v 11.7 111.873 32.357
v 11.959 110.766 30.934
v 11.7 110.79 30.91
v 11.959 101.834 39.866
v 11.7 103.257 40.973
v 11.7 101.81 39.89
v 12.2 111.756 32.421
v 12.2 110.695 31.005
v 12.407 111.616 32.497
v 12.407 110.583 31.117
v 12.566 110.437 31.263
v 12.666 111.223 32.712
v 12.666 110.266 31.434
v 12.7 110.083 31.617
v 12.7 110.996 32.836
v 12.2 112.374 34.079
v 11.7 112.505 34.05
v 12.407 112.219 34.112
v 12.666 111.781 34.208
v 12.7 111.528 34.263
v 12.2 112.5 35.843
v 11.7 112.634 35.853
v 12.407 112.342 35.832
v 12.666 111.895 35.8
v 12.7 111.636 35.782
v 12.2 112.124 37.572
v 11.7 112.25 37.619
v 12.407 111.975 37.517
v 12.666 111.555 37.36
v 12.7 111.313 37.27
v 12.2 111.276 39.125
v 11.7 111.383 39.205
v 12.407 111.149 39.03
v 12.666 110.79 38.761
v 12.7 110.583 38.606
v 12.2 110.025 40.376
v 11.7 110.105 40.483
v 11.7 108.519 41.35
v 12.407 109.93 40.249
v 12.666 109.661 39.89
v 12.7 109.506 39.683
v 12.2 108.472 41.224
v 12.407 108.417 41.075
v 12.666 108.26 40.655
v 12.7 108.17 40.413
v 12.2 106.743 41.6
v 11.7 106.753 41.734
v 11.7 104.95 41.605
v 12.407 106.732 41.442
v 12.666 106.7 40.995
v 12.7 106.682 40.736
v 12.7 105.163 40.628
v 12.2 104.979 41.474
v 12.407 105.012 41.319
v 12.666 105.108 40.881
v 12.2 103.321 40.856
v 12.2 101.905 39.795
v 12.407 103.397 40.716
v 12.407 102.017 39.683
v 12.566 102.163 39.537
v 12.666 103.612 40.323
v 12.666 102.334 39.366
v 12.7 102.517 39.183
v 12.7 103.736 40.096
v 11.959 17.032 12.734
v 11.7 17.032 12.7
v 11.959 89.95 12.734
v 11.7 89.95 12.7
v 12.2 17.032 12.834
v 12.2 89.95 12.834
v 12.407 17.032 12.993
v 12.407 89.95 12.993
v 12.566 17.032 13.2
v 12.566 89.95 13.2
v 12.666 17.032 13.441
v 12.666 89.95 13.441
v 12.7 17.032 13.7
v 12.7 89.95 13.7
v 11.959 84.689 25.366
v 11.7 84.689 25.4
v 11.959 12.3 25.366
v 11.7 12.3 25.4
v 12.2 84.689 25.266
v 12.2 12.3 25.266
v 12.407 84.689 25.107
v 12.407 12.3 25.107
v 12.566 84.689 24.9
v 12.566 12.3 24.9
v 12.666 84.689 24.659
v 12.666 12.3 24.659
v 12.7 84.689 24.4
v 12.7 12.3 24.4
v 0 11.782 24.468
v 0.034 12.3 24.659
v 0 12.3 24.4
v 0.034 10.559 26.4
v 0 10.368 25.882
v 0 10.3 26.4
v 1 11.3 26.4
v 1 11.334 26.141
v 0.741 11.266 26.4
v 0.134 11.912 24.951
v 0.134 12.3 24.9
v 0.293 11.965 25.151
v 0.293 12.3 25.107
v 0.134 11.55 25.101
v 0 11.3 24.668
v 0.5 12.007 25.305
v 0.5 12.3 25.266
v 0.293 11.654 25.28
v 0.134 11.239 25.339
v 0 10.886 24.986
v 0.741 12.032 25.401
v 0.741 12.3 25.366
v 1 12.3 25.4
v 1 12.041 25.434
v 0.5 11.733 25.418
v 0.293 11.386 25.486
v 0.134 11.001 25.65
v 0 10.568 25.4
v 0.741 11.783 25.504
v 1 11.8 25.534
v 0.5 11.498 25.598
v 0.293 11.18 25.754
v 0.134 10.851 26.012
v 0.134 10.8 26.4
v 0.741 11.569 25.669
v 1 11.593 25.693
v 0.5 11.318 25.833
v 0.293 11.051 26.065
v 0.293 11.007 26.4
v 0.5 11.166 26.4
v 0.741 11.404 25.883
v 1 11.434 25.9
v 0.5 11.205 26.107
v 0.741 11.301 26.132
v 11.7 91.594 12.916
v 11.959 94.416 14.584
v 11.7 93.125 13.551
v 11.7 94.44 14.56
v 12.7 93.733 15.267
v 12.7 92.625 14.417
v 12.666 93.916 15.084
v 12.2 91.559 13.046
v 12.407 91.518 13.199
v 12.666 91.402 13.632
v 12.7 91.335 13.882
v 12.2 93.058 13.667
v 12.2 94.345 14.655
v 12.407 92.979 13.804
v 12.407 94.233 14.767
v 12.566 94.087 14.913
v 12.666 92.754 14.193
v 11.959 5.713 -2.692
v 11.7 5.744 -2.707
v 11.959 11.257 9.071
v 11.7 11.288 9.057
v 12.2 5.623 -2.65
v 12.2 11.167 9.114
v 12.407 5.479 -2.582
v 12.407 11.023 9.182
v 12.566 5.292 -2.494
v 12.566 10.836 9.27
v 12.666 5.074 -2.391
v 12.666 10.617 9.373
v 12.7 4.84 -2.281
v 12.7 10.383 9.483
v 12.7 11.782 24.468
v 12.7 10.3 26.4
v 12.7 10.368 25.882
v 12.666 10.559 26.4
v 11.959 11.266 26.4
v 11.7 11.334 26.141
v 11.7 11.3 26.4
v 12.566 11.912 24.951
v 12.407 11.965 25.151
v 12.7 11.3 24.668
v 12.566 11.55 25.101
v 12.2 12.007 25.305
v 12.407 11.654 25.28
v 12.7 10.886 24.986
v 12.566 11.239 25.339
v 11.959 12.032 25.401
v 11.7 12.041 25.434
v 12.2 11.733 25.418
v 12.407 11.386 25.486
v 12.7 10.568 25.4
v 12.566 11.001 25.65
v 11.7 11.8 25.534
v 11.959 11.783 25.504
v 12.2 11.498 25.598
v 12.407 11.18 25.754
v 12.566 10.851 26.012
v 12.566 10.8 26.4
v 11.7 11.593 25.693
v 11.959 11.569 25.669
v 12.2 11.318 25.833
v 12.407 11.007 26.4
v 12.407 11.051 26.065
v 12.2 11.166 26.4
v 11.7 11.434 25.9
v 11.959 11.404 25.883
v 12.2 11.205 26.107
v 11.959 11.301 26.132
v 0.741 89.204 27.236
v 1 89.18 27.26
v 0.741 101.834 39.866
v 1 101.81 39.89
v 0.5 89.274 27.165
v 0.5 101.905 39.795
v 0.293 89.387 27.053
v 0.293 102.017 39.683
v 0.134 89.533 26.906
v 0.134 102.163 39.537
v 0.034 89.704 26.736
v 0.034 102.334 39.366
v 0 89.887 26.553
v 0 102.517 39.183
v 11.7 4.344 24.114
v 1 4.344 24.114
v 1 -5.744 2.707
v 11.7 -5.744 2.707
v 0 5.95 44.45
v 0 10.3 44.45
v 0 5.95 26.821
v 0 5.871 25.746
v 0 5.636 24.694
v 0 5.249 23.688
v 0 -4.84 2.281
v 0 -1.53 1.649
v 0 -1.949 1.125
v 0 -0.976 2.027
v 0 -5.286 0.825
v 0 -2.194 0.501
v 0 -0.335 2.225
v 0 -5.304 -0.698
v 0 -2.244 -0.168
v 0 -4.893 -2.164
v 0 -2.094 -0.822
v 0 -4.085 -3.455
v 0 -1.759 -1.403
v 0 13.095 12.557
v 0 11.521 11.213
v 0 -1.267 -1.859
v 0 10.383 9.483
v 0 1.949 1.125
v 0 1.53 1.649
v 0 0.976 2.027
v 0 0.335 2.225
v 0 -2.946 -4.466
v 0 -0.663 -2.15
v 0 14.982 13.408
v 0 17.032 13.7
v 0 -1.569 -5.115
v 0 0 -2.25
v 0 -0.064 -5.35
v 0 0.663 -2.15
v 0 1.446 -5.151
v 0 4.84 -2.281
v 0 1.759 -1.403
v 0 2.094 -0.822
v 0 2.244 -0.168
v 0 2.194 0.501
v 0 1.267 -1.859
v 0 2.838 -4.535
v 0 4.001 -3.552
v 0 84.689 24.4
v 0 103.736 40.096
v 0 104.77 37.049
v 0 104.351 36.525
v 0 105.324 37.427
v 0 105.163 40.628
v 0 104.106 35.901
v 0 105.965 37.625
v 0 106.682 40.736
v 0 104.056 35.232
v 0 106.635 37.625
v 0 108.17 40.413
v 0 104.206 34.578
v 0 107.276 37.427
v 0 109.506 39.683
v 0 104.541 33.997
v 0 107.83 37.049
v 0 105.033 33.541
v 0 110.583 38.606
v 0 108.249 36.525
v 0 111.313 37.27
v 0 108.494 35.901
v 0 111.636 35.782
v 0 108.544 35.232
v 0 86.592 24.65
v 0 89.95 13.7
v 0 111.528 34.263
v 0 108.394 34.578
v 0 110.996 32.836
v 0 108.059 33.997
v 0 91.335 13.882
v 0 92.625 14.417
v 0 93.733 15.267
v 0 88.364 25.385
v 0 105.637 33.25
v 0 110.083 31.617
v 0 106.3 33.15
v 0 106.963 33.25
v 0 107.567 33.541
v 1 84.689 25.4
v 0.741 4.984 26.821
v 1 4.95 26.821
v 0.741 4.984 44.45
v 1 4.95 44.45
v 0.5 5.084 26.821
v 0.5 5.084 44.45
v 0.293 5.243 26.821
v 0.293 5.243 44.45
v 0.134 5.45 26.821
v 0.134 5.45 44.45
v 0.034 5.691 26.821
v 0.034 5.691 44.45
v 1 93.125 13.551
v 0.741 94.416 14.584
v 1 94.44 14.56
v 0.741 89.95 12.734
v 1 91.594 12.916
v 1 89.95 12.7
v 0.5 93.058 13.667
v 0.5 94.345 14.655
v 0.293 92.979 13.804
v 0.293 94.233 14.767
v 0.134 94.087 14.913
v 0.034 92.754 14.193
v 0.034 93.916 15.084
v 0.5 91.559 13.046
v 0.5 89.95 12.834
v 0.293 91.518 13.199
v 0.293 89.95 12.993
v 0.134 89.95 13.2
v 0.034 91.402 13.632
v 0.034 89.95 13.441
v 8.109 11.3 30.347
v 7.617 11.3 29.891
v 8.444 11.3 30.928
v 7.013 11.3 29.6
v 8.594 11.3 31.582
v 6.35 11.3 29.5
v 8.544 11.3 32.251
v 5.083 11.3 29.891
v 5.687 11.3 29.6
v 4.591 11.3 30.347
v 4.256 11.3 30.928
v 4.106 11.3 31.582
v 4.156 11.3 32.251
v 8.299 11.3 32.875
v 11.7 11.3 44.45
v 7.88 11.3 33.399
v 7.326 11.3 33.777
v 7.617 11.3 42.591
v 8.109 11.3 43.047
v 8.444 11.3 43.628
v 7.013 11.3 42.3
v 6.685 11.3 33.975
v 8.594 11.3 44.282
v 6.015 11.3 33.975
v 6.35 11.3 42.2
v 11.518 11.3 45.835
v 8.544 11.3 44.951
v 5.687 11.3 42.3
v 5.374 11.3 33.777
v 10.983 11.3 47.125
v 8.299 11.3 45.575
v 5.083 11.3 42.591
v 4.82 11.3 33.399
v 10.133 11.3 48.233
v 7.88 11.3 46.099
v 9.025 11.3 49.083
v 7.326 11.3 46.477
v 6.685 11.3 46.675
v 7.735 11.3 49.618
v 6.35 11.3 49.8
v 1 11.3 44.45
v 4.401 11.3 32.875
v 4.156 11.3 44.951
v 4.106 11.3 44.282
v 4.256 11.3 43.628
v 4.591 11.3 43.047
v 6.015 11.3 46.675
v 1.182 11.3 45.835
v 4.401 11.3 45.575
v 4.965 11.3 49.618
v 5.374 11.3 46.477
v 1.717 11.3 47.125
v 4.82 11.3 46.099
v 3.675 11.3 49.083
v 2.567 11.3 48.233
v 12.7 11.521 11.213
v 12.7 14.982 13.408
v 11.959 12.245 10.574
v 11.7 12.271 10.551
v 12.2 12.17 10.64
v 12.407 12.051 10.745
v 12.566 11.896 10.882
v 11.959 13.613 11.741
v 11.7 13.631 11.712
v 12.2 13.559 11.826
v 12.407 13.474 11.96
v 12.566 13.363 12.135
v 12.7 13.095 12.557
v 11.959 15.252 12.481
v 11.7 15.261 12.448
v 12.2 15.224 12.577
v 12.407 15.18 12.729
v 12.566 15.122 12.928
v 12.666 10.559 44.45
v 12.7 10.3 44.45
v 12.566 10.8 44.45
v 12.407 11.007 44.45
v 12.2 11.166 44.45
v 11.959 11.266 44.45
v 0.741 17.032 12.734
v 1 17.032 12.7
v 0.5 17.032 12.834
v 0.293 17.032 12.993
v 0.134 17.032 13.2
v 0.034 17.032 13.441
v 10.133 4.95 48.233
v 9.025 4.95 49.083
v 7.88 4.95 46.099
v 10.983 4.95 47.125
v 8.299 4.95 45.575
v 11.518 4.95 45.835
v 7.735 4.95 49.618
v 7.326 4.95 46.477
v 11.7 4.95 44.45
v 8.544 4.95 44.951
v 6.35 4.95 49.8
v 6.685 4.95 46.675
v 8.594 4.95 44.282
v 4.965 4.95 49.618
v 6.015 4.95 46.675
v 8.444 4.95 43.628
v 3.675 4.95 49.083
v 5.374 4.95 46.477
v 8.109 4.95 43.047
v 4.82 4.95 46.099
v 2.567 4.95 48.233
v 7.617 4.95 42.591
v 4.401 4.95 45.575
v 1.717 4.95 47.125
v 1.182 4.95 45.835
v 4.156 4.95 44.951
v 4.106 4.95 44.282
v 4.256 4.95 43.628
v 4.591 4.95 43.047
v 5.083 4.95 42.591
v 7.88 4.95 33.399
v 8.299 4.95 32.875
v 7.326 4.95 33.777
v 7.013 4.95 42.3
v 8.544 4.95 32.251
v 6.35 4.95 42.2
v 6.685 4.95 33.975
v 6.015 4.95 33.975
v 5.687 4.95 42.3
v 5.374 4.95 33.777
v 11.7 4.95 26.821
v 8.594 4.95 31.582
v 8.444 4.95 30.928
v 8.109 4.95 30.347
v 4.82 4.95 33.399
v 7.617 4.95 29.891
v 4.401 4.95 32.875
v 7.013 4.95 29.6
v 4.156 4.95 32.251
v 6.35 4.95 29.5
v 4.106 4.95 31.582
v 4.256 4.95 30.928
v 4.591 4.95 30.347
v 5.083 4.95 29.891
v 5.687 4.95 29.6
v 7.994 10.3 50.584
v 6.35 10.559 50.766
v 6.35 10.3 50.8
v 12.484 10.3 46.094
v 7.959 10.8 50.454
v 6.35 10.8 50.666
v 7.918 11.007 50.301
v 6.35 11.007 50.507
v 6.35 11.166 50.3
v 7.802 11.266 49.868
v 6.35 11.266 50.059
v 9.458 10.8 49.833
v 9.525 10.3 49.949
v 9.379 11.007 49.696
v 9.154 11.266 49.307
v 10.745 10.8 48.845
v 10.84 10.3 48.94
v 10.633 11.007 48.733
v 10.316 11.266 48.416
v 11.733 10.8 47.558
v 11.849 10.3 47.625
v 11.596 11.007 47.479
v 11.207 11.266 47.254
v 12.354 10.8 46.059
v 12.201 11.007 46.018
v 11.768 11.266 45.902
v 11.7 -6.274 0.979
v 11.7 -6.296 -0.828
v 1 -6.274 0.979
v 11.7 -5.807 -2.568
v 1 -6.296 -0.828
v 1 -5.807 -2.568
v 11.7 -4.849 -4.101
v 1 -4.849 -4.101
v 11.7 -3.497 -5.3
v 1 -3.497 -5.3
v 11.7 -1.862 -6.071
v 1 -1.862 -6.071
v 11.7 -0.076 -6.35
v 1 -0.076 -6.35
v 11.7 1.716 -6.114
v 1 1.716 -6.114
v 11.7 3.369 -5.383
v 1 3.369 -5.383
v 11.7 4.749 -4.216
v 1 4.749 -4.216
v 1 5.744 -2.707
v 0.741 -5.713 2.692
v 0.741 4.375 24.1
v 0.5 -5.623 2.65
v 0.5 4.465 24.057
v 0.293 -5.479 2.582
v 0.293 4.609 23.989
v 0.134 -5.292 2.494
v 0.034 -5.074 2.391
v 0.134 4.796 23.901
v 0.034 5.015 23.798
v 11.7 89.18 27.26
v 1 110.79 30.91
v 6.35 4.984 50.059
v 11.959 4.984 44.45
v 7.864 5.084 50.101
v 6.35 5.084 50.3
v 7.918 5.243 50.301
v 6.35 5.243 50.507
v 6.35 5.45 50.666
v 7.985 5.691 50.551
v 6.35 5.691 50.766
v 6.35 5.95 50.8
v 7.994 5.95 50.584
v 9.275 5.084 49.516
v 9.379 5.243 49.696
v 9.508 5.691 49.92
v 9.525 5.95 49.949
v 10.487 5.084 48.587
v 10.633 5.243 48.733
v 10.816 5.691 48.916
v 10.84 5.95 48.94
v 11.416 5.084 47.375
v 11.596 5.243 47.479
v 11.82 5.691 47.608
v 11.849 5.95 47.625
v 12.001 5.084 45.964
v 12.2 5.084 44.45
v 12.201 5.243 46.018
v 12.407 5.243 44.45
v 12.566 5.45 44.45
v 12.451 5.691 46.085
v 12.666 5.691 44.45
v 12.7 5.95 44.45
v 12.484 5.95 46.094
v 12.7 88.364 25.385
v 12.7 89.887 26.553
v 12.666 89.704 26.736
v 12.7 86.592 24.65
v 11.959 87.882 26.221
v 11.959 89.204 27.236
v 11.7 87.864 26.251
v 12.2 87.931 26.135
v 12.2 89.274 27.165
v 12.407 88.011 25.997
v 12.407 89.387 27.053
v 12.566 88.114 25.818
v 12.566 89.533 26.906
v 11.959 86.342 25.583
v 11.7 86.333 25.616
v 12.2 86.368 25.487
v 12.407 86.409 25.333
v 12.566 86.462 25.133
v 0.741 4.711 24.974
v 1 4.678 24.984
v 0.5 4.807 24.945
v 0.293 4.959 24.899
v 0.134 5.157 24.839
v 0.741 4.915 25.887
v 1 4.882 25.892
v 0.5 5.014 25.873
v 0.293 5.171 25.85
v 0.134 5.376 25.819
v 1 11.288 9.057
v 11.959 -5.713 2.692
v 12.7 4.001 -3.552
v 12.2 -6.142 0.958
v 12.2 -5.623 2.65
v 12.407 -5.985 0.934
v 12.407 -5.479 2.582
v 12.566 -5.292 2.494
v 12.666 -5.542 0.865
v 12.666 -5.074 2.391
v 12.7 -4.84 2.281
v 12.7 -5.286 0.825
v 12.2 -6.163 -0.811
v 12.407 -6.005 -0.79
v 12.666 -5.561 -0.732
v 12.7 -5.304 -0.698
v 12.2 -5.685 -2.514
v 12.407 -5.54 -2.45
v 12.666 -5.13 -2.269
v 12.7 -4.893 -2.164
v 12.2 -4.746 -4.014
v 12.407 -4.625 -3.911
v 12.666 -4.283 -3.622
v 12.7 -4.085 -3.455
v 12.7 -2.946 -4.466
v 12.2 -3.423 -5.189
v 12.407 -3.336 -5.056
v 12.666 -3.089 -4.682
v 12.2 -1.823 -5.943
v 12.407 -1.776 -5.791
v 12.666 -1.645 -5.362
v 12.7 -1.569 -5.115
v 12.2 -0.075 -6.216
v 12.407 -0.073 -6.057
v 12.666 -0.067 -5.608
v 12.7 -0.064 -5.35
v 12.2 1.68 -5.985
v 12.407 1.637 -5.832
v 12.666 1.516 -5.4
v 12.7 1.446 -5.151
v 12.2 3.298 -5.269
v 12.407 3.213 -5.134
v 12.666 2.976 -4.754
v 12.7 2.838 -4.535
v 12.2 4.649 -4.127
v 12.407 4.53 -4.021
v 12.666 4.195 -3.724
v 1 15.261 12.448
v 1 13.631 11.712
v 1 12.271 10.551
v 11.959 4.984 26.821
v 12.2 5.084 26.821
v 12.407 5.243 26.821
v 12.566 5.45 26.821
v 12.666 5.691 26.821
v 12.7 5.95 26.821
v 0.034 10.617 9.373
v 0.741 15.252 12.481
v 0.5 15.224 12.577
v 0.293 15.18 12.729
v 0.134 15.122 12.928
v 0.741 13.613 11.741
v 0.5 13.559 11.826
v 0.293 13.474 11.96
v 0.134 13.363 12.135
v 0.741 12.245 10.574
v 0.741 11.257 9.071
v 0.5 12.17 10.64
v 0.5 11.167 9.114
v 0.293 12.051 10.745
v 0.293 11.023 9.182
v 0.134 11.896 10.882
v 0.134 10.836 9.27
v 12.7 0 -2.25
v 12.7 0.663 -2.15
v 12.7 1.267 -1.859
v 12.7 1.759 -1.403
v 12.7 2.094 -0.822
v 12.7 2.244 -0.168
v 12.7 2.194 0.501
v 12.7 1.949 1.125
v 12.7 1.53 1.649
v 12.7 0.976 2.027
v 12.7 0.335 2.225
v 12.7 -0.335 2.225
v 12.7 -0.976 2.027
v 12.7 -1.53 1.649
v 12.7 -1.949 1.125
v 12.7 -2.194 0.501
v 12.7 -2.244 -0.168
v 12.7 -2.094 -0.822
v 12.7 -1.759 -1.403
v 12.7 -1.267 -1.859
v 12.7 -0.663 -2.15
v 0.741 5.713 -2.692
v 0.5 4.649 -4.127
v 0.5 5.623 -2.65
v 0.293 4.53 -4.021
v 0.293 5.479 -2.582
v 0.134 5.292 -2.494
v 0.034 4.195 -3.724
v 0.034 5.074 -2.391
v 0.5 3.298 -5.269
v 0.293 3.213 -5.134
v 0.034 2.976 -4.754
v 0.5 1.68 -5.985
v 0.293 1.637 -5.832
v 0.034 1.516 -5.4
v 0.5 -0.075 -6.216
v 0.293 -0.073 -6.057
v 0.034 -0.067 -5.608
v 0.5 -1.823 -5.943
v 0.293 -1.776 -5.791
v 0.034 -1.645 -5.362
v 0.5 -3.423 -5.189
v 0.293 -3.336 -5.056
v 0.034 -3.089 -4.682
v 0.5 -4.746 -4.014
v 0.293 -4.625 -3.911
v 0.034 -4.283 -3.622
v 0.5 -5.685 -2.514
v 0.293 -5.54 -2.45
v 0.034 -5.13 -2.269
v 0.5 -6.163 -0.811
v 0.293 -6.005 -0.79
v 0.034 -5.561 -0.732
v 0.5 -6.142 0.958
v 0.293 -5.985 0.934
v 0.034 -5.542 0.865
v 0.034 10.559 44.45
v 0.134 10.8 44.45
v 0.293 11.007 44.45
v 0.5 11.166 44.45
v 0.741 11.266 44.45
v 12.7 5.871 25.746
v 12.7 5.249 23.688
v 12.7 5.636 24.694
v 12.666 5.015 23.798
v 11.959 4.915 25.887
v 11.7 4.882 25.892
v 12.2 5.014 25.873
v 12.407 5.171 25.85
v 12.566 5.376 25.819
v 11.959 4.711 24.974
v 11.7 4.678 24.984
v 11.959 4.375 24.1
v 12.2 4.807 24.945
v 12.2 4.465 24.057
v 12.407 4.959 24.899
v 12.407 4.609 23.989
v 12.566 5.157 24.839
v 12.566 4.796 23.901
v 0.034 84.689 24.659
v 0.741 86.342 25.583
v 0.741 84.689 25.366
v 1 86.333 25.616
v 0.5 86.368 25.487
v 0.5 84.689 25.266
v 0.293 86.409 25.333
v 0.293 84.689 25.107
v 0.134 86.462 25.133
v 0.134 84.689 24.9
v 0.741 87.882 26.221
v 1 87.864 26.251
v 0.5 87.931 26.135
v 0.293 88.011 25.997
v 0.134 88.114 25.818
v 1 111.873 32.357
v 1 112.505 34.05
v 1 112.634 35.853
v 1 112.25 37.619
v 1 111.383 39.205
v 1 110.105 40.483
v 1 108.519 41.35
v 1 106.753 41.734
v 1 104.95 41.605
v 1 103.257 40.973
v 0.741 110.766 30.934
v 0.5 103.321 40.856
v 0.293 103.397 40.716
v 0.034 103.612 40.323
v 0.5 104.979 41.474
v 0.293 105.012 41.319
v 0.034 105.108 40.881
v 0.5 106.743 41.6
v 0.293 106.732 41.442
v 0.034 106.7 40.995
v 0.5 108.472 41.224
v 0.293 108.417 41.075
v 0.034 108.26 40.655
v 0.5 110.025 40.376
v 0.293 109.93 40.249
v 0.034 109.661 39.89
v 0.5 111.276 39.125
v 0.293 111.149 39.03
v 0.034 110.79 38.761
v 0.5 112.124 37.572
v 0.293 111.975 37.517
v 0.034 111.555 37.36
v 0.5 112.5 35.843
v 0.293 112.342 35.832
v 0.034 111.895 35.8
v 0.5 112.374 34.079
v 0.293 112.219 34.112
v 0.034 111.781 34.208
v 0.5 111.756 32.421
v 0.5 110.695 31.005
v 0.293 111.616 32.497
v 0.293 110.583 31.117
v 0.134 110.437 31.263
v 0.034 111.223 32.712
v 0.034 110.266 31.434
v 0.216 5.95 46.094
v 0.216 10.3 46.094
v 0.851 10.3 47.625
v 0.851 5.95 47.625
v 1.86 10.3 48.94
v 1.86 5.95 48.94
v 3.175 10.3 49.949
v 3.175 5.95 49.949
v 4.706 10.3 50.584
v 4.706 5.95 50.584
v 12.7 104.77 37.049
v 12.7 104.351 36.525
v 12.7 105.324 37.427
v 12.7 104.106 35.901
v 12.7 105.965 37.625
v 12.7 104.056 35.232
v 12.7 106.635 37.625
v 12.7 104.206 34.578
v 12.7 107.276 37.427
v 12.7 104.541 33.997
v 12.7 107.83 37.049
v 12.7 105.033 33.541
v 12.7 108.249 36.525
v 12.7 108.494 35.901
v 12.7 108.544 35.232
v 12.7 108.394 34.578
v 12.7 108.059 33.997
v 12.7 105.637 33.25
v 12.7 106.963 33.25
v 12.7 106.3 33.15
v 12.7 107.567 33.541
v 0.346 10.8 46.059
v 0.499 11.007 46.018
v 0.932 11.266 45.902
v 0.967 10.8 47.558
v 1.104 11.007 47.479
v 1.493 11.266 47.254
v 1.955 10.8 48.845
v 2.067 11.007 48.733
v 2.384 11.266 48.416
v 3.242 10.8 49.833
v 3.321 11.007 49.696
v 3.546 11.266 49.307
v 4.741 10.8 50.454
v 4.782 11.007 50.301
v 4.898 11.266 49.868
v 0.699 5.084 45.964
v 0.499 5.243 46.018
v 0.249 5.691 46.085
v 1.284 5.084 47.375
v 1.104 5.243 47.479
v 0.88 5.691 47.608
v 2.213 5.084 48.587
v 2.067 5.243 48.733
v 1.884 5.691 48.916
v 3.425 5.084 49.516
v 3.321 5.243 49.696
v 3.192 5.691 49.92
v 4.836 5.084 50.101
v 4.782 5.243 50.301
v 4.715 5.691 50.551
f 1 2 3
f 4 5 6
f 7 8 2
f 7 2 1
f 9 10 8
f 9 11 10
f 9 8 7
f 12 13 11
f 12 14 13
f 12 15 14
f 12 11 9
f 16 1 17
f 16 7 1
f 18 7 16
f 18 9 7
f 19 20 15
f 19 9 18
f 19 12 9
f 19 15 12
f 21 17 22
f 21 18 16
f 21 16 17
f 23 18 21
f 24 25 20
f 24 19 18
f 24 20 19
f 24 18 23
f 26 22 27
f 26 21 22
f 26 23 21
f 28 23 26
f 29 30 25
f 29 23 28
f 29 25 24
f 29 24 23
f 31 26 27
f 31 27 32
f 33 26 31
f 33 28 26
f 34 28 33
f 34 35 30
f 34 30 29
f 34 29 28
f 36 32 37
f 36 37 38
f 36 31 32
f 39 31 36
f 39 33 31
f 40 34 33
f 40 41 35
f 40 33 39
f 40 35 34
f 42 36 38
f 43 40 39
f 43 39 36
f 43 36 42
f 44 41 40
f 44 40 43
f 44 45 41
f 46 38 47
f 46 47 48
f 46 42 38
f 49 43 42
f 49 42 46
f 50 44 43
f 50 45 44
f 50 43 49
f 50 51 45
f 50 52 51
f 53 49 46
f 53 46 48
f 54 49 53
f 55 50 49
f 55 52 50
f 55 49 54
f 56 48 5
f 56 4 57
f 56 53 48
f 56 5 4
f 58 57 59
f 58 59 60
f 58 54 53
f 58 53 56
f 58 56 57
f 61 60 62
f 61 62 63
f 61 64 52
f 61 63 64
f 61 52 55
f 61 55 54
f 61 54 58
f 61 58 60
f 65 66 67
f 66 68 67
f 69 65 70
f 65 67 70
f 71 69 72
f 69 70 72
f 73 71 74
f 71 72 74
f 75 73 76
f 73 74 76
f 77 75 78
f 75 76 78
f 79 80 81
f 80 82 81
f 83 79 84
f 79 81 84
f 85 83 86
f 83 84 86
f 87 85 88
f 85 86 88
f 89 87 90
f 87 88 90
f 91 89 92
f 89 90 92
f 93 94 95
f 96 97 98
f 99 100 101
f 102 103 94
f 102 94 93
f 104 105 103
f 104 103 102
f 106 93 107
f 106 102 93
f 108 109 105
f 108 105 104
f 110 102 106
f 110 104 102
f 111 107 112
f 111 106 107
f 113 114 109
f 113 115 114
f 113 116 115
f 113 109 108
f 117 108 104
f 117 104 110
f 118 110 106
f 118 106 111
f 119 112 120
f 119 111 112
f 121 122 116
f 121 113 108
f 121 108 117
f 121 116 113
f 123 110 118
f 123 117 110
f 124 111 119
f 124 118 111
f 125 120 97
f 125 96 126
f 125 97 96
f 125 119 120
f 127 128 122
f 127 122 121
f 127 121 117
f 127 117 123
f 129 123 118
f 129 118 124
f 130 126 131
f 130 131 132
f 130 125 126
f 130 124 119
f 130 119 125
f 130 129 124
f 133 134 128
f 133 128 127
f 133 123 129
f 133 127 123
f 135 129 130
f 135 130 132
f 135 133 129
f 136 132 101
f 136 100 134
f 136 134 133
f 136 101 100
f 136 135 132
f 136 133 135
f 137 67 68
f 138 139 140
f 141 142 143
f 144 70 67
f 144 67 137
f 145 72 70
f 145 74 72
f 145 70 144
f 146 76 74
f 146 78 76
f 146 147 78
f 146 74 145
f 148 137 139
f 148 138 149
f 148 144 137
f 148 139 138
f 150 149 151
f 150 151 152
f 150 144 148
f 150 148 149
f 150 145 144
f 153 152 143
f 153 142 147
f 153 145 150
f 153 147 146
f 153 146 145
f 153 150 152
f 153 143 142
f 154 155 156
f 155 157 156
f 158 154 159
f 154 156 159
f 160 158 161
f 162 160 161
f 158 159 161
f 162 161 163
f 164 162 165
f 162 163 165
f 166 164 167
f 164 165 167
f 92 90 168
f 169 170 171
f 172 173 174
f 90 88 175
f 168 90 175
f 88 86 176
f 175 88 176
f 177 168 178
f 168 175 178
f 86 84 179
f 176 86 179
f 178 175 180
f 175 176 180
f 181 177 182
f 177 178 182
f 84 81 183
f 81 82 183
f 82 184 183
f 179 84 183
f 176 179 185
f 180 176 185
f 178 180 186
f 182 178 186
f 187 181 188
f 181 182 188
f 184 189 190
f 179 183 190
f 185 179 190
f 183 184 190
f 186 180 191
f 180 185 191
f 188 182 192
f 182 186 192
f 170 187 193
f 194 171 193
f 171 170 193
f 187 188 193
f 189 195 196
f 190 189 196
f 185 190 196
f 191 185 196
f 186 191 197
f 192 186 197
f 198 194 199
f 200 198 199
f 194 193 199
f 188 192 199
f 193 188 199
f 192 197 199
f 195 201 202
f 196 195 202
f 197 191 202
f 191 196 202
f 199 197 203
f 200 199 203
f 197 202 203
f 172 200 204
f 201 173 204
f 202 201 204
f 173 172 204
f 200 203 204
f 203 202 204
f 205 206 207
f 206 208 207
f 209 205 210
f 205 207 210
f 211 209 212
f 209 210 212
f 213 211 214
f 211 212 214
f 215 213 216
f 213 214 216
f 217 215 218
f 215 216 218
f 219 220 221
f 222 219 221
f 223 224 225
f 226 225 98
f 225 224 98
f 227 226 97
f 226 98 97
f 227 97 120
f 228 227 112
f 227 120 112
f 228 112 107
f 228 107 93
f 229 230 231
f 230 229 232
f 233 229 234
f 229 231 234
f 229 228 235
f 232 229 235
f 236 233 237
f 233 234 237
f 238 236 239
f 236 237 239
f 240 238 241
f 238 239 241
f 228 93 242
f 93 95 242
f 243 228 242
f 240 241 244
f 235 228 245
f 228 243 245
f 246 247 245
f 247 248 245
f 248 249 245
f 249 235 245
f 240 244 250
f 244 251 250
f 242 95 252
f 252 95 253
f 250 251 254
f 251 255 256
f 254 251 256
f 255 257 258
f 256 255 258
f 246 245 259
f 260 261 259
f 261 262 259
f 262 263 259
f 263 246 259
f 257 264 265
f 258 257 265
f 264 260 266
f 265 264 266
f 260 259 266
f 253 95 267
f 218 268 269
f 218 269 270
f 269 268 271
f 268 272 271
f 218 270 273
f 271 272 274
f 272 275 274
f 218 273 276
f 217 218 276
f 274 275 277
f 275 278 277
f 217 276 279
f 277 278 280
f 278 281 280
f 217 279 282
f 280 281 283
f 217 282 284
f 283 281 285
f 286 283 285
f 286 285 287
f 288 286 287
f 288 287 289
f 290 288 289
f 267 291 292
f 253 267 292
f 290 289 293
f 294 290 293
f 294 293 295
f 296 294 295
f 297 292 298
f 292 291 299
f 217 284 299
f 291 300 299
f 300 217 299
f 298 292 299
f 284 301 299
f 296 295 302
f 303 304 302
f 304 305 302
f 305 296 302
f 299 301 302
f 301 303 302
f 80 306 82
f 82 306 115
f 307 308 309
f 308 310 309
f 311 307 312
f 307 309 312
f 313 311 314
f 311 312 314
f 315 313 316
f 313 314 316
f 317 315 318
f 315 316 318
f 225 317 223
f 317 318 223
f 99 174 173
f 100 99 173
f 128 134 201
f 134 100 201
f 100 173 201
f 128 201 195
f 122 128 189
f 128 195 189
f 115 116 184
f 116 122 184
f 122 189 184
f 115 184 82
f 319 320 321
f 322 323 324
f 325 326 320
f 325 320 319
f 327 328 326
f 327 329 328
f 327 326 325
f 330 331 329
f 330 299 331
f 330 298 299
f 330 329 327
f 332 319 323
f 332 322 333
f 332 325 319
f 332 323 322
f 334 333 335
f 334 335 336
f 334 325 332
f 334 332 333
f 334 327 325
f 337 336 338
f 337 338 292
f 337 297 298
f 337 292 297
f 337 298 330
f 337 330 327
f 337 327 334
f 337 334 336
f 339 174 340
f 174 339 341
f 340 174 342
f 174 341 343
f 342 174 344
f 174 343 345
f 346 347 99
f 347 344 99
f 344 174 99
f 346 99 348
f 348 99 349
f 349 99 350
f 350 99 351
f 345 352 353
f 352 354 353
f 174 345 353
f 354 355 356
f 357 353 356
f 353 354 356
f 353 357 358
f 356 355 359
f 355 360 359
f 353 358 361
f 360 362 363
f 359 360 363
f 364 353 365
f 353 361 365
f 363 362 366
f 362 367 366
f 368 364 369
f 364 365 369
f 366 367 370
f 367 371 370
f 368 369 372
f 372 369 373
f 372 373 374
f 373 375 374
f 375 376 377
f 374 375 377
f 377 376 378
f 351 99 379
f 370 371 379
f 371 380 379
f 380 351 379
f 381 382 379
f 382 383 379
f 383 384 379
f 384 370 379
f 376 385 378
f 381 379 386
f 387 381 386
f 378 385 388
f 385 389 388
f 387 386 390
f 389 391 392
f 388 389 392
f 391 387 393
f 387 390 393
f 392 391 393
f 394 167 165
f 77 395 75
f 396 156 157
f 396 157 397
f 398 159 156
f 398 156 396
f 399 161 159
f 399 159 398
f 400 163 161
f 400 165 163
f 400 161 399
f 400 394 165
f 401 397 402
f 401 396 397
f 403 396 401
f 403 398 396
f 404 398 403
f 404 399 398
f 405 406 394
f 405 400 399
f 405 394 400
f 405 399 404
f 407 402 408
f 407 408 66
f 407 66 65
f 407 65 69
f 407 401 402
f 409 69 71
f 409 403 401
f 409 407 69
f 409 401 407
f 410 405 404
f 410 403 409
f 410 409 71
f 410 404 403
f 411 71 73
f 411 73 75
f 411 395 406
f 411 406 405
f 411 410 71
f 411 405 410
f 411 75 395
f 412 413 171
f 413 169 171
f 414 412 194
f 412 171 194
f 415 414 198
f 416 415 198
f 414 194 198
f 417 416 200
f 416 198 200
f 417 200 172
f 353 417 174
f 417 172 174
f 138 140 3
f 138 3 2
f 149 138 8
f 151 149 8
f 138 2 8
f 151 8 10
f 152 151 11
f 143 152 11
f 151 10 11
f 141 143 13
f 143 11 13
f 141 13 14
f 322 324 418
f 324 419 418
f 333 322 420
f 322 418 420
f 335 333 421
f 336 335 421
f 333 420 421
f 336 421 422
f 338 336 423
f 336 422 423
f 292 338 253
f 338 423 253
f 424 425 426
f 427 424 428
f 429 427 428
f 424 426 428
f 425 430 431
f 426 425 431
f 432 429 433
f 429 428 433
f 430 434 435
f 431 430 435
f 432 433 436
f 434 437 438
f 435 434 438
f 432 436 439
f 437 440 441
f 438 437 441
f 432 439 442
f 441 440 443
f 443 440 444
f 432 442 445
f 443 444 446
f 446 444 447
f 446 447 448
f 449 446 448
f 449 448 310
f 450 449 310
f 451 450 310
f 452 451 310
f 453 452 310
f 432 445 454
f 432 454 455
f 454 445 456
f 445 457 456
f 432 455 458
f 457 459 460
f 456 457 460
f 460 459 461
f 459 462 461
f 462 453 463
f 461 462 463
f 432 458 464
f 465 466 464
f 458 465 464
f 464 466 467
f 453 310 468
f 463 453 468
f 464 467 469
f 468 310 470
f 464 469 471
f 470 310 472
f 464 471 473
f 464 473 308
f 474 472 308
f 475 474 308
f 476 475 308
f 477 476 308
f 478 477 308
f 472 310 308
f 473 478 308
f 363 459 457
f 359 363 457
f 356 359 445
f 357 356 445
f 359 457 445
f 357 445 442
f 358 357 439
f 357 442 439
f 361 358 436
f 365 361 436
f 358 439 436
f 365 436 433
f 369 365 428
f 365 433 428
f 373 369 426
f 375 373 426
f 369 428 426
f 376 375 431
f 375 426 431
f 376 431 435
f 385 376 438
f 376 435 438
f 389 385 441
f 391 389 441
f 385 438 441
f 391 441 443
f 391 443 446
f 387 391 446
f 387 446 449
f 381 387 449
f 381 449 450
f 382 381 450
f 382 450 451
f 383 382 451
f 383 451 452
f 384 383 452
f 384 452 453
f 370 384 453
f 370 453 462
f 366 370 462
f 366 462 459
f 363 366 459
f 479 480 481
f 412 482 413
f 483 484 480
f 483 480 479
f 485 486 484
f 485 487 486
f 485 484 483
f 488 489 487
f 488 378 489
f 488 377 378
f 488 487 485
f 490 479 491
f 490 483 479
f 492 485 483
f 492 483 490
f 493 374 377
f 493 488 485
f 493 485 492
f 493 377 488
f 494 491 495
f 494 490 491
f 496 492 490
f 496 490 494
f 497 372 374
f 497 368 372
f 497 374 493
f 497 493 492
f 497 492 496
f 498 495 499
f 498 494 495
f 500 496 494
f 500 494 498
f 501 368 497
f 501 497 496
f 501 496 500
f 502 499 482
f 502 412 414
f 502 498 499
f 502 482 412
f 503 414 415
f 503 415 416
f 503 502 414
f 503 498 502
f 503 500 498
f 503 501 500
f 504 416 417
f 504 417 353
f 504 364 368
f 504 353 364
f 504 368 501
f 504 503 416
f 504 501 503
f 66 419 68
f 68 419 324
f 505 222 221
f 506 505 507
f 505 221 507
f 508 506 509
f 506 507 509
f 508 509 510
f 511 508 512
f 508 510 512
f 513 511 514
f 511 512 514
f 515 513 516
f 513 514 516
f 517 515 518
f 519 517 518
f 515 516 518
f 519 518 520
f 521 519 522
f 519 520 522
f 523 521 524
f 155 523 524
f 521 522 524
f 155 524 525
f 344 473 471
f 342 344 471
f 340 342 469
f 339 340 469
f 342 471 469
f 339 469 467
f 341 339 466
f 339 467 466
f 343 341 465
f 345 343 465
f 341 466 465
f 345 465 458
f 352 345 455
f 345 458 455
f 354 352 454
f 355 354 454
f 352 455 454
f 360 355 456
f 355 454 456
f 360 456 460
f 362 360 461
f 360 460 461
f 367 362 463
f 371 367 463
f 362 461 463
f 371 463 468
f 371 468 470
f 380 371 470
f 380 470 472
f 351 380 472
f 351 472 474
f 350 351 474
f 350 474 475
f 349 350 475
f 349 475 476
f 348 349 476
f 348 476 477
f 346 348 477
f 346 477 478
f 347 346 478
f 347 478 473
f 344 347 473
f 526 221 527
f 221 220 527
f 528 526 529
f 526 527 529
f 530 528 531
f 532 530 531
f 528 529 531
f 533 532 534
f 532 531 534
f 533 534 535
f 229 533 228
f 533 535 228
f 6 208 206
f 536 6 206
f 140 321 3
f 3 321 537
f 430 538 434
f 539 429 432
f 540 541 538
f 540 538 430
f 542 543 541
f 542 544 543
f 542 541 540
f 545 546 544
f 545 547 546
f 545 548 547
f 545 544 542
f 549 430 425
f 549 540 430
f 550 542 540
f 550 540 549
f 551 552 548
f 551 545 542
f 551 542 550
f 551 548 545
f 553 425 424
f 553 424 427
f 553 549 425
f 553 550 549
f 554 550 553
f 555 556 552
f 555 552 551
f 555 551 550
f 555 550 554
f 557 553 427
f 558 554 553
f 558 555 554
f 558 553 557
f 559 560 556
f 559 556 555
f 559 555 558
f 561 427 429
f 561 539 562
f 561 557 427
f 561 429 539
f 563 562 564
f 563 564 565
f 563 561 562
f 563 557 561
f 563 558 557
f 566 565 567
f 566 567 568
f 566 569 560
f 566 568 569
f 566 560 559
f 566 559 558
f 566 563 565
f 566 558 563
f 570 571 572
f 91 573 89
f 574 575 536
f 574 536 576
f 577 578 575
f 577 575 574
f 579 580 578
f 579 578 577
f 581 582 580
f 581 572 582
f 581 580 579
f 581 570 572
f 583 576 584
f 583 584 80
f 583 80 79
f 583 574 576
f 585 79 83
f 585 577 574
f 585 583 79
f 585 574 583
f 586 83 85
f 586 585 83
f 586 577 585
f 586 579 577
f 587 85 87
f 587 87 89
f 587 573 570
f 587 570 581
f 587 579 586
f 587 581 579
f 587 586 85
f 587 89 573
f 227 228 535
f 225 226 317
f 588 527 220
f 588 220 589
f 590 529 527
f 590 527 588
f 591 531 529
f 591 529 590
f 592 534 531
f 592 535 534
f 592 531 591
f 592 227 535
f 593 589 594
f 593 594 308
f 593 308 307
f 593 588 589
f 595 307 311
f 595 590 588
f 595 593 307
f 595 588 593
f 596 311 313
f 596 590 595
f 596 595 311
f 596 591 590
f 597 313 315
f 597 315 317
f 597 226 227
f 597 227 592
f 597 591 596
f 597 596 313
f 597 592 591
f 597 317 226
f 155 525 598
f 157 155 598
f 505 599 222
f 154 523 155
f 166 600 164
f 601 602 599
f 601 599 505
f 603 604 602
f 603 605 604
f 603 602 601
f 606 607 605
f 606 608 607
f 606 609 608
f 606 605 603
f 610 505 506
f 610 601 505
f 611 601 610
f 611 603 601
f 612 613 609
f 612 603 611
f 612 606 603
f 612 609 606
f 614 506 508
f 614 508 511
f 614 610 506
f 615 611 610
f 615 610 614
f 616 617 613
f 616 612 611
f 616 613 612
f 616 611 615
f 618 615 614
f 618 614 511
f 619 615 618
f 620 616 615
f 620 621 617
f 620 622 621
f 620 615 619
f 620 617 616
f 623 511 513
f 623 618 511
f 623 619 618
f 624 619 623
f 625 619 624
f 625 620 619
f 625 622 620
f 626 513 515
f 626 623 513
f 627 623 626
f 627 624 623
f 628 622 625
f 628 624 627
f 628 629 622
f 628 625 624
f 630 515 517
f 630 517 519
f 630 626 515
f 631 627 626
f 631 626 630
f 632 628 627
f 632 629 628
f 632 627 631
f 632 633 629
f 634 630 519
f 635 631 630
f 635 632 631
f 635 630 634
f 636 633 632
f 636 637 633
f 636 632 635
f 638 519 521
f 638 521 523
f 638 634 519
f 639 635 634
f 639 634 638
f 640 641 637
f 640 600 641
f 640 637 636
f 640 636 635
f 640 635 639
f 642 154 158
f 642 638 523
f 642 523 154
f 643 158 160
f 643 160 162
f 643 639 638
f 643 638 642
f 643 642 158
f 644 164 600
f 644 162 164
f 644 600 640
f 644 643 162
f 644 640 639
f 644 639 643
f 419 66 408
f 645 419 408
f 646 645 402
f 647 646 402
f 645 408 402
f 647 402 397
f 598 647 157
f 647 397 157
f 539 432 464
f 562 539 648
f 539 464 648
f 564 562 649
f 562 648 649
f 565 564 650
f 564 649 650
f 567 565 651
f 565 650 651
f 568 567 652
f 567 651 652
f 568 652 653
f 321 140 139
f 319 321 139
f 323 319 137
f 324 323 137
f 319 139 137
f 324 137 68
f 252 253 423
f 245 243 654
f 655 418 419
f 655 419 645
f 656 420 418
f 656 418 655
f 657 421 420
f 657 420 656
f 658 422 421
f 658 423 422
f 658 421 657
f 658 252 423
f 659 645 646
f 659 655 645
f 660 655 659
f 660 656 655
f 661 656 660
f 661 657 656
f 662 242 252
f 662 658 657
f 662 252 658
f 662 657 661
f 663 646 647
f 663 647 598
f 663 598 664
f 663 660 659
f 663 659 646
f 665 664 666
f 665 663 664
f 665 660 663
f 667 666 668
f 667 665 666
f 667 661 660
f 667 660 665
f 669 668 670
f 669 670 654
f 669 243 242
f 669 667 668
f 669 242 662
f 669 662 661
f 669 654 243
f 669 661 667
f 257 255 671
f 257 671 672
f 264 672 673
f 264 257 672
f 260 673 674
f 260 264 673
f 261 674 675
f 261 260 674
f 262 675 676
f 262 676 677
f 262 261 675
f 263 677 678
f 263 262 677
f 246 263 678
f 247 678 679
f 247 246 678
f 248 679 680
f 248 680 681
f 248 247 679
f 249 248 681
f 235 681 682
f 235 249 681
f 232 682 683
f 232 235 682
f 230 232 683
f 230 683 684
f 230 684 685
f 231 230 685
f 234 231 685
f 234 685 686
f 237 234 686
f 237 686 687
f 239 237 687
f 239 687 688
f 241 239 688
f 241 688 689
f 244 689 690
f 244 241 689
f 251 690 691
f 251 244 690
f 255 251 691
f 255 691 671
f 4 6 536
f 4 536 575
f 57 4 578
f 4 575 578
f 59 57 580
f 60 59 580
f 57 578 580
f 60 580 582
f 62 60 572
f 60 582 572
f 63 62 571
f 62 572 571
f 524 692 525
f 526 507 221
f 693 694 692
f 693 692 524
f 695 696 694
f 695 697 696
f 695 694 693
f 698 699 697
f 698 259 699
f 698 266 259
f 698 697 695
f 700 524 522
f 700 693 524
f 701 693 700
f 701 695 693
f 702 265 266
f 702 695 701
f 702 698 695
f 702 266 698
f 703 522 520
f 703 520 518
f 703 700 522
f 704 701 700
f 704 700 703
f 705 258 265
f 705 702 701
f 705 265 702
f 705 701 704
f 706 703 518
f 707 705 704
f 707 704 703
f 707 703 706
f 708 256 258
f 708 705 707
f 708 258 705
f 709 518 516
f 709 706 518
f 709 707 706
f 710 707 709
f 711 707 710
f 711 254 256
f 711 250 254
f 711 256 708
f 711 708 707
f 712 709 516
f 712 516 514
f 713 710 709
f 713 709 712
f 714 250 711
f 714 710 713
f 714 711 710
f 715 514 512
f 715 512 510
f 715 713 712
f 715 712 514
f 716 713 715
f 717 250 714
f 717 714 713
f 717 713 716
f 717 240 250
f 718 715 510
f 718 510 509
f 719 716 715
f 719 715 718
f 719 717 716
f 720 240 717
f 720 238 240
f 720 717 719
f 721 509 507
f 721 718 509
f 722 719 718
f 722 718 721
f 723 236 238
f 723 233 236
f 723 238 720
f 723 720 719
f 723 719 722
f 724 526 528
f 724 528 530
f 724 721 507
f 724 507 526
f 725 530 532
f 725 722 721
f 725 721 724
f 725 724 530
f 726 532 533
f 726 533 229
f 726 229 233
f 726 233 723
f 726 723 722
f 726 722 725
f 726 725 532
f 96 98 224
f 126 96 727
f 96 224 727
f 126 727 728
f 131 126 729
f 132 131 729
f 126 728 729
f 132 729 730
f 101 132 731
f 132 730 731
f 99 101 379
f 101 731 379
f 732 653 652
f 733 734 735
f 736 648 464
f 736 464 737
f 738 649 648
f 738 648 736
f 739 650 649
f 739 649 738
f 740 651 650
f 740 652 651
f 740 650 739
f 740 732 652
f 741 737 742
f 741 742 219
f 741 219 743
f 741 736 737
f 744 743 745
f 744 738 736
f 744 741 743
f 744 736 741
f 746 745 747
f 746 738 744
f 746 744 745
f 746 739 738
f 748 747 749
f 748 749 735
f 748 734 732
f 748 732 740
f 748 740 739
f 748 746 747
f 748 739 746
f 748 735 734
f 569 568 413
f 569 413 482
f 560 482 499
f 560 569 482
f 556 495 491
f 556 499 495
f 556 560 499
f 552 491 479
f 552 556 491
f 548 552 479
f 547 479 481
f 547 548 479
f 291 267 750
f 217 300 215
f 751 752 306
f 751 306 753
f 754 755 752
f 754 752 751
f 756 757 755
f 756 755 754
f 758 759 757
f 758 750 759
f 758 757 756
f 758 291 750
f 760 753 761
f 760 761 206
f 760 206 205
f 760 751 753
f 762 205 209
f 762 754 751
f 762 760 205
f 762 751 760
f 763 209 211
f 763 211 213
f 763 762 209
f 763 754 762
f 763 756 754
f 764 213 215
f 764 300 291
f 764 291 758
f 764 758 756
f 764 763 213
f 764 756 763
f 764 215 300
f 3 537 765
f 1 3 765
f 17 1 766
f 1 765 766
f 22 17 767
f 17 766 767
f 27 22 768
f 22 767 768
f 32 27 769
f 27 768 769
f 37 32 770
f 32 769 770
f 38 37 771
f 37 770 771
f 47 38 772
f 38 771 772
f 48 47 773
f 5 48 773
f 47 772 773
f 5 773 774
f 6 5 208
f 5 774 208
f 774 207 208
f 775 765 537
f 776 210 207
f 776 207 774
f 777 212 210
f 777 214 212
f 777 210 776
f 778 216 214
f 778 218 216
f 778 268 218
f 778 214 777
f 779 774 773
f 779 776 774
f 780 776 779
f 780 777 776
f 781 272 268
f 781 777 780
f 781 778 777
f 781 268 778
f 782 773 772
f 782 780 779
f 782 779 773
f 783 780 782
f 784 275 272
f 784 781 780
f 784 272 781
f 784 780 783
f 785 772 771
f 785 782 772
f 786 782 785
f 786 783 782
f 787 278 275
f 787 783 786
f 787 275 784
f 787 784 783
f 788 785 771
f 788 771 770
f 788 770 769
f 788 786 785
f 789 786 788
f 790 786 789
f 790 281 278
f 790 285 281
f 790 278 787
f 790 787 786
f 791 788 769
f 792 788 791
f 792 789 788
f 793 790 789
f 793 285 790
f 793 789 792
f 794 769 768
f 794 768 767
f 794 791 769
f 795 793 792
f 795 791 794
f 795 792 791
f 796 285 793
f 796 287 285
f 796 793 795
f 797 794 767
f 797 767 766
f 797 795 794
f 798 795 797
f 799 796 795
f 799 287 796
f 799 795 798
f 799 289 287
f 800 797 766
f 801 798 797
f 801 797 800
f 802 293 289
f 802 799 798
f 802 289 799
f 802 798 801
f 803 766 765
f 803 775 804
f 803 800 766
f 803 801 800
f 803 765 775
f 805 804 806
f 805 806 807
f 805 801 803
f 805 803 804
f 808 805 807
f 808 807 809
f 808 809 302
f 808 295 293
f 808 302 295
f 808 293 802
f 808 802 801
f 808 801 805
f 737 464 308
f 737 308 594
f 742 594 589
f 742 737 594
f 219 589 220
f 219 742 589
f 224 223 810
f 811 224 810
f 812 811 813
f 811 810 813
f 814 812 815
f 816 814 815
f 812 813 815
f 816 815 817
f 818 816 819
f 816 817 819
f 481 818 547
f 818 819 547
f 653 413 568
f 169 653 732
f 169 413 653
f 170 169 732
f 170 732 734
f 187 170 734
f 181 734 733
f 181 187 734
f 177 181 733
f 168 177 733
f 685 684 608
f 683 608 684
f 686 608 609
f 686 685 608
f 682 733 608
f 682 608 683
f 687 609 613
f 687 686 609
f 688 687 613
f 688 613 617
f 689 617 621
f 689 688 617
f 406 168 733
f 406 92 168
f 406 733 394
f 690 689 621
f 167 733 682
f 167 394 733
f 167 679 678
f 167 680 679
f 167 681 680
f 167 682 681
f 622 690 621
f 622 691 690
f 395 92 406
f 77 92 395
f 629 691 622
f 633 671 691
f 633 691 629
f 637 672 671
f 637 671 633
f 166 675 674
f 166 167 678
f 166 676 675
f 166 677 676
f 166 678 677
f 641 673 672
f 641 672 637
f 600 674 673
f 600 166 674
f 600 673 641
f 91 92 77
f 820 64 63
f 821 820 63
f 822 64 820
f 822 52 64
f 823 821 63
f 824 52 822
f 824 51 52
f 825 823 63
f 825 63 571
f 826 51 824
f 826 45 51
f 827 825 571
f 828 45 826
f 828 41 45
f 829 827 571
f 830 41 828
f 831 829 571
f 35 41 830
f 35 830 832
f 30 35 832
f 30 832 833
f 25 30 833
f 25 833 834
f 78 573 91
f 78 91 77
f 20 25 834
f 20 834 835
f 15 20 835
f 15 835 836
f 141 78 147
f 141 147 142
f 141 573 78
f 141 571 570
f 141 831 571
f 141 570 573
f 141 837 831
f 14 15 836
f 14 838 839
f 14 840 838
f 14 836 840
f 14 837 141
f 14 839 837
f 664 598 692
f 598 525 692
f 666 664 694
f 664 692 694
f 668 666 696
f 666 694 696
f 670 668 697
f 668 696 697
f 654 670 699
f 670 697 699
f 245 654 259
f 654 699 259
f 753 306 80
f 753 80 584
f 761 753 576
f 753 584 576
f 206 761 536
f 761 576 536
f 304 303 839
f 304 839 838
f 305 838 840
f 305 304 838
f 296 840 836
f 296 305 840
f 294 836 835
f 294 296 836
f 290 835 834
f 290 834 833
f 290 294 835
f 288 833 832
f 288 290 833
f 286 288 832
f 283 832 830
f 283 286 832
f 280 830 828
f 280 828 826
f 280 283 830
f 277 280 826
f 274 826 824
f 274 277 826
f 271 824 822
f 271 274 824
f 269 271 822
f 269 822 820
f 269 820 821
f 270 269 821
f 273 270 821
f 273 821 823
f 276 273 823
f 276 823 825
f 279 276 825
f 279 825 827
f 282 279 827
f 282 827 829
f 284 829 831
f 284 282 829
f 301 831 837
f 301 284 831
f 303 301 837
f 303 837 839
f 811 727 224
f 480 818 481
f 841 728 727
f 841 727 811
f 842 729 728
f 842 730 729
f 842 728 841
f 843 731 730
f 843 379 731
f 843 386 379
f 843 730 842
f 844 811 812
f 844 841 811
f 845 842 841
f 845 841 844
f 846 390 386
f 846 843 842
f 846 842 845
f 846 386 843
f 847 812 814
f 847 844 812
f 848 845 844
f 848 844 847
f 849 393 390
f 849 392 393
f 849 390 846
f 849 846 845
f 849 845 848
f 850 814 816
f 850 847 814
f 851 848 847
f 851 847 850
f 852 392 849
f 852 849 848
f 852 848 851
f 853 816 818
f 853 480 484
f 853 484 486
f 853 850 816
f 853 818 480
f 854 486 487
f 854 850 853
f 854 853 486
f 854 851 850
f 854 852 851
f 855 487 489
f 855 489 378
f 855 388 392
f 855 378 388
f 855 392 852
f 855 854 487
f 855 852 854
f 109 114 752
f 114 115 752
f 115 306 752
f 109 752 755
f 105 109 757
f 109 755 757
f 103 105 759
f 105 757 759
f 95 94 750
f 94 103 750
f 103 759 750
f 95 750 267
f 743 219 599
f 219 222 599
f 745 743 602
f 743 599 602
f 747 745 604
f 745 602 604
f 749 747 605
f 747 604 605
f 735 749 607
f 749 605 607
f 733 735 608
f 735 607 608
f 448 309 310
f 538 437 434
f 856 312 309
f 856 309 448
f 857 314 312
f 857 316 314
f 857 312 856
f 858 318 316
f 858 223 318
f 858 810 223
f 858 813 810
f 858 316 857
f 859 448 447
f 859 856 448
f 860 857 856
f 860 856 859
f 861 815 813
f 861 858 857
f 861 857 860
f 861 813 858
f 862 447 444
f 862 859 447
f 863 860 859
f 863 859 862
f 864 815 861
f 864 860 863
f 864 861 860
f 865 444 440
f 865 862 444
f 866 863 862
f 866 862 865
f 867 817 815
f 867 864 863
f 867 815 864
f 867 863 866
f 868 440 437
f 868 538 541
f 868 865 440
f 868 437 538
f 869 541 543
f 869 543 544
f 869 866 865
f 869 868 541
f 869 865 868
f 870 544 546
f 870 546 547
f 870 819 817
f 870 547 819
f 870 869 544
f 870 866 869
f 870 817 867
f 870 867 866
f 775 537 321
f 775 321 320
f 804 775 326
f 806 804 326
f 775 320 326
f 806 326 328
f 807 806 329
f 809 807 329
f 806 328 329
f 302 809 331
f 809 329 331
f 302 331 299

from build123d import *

# Parameters (mm, degrees)
SKETCH1_R           = 2.25
BOSS_EXTRUDE1_DEPTH = 12.7
FILLET1_R           = 6.35
FILLET3_R           = 6.35
FILLET4_R           = 1
CUT_EXTRUDE1_REACH  = 121.755
SKETCH2_R           = 2.25


with BuildPart() as part:
    # Sketch1 → Boss-Extrude1 (new body)
    with BuildSketch(Plane(origin=(0, 0, 0), x_dir=(0, 0, -1), z_dir=(1, 0, 0))):
        with BuildLine():
            Line((-25.4, 87.319743879), (-25.4, 11.3))
            Line((-25.4, 11.3), (-50.8, 11.3))
            Line((-50.8, 11.3), (-50.8, 4.95))
            Line((-50.8, 4.95), (-25.4, 4.95))
            Line((-25.4, 4.95), (-2.706927177, -5.744131375))
            ThreePointArc((-2.706927177, -5.744131375), (5.744131375, -2.706927177), (2.706927177, 5.744131375))
            Line((2.706927177, 5.744131375), (-12.7, 13.004659934))
            Line((-12.7, 13.004659934), (-12.7, 92.580256121))
            Line((-12.7, 92.580256121), (-30.909871939, 110.790128061))
            ThreePointArc((-30.909871939, 110.790128061), (-39.890128061, 110.790128061), (-39.890128061, 101.809871939))
            Line((-39.890128061, 101.809871939), (-25.4, 87.319743879))
        make_face()
        with Locations((-35.4, 106.3)):
            Circle(SKETCH1_R, mode=Mode.SUBTRACT)
        Circle(SKETCH1_R, mode=Mode.SUBTRACT)
    extrude(amount=BOSS_EXTRUDE1_DEPTH)

    # Fillet1
    fillet1_edges = [part.edges().sort_by_distance(p)[0] for p in [
        (6.35, 4.95, 25.4),
        (6.35, 87.319743879, 25.4),
        (6.35, 92.580256121, 12.7),
        (6.35, 13.004659934, 12.7),
    ]]
    fillet(fillet1_edges, radius=FILLET1_R)

    # Fillet3
    fillet3_edges = [part.edges().sort_by_distance(p)[0] for p in [
        (0, 8.125, 50.8),
        (12.7, 8.125, 50.8),
    ]]
    fillet(fillet3_edges, radius=FILLET3_R - 0.0001)  # a hair under: the kernel refuses the full size

    # Fillet4
    fillet4_edges = [part.edges().sort_by_distance(p)[0] for p in [
        (12.7, -2.706927177, -5.744131375),
        (0, 11.3, 34.92505),
        (0, 47.994743879, 25.4),
        (0, 110.790128061, 39.890128061),
        (0, 102.615128061, 22.734871939),
        (0, -2.706927177, -5.744131375),
        (6.35, 11.3, 25.4),
        (12.7, 102.615128061, 22.734871939),
        (12.7, 110.790128061, 39.890128061),
        (0, -0.7, 13.410633407),
        (12.7, -0.7, 13.410633407),
        (12.7, 47.994743879, 25.4),
        (0, 53.490994951, 12.7),
        (12.7, 53.490994951, 12.7),
        (0, 8.515994951, 3.175),
        (12.7, 8.515994951, 3.175),
        (12.7, 11.3, 34.92505),
        (0, 95.494743879, 33.575),
        (0, 92.380039796, 13.183364969),
        (12.7, 95.494743879, 33.575),
        (12.7, 92.380039796, 13.183364969),
        (0, 4.796681944, 25.434315884),
        (12.7, 4.796681944, 25.434315884),
        (0, 13.630996486, 11.712438232),
        (12.7, 13.630996486, 11.712438232),
        (0, 87.119527553, 25.883364969),
        (12.7, 87.119527553, 25.883364969),
        (0, 4.95, 35.635683407),
        (12.7, 4.95, 35.635683407),
        (10.84015735, 4.95, 48.94015735),
        (1.85984265, 4.95, 48.94015735),
        (10.84015735, 11.3, 48.94015735),
        (1.85984265, 11.3, 48.94015735),
    ]]
    fillet(fillet4_edges, radius=FILLET4_R)

    # Sketch2 → Cut-Extrude1 (cut, up to next)
    with BuildSketch(Plane.XZ.offset(-4.95), mode=Mode.PRIVATE) as cut_extrude1_sk1:
        with Locations(Location((6.35, 31.75, 0), (0, 0, 270))):
            Circle(SKETCH2_R)
    cut_extrude1_tool1 = extrude(cut_extrude1_sk1.sketch, amount=-CUT_EXTRUDE1_REACH, mode=Mode.PRIVATE) & part.part
    # Sketch2 → Cut-Extrude1 (cut, up to next)
    with BuildSketch(Plane.XZ.offset(-4.95), mode=Mode.PRIVATE) as cut_extrude1_sk2:
        with Locations(Location((6.35, 44.45, 0), (0, 0, 270))):
            Circle(SKETCH2_R)
    cut_extrude1_tool2 = extrude(cut_extrude1_sk2.sketch, amount=-CUT_EXTRUDE1_REACH, mode=Mode.PRIVATE) & part.part
    add(cut_extrude1_tool1.solids().sort_by_distance((6.35, 4.95, 31.75))[0], mode=Mode.SUBTRACT)
    add(cut_extrude1_tool2.solids().sort_by_distance((6.35, 4.95, 44.45))[0], mode=Mode.SUBTRACT)


solid = part.part
